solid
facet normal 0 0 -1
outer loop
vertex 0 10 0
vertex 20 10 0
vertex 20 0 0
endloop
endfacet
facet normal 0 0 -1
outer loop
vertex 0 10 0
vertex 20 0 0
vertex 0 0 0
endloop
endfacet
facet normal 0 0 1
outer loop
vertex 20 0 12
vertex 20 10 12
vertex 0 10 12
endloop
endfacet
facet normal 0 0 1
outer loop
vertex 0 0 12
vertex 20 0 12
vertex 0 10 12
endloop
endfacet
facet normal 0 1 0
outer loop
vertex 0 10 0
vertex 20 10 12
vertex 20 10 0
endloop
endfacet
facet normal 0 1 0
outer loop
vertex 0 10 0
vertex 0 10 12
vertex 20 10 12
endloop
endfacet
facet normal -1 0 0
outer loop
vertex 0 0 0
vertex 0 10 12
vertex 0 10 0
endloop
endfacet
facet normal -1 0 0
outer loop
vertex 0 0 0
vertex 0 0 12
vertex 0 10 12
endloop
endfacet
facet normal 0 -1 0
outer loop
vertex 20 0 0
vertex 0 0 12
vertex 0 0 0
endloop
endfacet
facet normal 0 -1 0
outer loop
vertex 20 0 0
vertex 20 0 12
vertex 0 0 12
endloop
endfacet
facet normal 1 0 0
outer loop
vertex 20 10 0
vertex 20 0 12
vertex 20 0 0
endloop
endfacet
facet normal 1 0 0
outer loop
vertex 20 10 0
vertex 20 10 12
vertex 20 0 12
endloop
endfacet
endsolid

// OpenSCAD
linear_extrude(height = 12)
  polygon(points = [[0, 0], [20, 0], [20, 10], [0, 10]]);
